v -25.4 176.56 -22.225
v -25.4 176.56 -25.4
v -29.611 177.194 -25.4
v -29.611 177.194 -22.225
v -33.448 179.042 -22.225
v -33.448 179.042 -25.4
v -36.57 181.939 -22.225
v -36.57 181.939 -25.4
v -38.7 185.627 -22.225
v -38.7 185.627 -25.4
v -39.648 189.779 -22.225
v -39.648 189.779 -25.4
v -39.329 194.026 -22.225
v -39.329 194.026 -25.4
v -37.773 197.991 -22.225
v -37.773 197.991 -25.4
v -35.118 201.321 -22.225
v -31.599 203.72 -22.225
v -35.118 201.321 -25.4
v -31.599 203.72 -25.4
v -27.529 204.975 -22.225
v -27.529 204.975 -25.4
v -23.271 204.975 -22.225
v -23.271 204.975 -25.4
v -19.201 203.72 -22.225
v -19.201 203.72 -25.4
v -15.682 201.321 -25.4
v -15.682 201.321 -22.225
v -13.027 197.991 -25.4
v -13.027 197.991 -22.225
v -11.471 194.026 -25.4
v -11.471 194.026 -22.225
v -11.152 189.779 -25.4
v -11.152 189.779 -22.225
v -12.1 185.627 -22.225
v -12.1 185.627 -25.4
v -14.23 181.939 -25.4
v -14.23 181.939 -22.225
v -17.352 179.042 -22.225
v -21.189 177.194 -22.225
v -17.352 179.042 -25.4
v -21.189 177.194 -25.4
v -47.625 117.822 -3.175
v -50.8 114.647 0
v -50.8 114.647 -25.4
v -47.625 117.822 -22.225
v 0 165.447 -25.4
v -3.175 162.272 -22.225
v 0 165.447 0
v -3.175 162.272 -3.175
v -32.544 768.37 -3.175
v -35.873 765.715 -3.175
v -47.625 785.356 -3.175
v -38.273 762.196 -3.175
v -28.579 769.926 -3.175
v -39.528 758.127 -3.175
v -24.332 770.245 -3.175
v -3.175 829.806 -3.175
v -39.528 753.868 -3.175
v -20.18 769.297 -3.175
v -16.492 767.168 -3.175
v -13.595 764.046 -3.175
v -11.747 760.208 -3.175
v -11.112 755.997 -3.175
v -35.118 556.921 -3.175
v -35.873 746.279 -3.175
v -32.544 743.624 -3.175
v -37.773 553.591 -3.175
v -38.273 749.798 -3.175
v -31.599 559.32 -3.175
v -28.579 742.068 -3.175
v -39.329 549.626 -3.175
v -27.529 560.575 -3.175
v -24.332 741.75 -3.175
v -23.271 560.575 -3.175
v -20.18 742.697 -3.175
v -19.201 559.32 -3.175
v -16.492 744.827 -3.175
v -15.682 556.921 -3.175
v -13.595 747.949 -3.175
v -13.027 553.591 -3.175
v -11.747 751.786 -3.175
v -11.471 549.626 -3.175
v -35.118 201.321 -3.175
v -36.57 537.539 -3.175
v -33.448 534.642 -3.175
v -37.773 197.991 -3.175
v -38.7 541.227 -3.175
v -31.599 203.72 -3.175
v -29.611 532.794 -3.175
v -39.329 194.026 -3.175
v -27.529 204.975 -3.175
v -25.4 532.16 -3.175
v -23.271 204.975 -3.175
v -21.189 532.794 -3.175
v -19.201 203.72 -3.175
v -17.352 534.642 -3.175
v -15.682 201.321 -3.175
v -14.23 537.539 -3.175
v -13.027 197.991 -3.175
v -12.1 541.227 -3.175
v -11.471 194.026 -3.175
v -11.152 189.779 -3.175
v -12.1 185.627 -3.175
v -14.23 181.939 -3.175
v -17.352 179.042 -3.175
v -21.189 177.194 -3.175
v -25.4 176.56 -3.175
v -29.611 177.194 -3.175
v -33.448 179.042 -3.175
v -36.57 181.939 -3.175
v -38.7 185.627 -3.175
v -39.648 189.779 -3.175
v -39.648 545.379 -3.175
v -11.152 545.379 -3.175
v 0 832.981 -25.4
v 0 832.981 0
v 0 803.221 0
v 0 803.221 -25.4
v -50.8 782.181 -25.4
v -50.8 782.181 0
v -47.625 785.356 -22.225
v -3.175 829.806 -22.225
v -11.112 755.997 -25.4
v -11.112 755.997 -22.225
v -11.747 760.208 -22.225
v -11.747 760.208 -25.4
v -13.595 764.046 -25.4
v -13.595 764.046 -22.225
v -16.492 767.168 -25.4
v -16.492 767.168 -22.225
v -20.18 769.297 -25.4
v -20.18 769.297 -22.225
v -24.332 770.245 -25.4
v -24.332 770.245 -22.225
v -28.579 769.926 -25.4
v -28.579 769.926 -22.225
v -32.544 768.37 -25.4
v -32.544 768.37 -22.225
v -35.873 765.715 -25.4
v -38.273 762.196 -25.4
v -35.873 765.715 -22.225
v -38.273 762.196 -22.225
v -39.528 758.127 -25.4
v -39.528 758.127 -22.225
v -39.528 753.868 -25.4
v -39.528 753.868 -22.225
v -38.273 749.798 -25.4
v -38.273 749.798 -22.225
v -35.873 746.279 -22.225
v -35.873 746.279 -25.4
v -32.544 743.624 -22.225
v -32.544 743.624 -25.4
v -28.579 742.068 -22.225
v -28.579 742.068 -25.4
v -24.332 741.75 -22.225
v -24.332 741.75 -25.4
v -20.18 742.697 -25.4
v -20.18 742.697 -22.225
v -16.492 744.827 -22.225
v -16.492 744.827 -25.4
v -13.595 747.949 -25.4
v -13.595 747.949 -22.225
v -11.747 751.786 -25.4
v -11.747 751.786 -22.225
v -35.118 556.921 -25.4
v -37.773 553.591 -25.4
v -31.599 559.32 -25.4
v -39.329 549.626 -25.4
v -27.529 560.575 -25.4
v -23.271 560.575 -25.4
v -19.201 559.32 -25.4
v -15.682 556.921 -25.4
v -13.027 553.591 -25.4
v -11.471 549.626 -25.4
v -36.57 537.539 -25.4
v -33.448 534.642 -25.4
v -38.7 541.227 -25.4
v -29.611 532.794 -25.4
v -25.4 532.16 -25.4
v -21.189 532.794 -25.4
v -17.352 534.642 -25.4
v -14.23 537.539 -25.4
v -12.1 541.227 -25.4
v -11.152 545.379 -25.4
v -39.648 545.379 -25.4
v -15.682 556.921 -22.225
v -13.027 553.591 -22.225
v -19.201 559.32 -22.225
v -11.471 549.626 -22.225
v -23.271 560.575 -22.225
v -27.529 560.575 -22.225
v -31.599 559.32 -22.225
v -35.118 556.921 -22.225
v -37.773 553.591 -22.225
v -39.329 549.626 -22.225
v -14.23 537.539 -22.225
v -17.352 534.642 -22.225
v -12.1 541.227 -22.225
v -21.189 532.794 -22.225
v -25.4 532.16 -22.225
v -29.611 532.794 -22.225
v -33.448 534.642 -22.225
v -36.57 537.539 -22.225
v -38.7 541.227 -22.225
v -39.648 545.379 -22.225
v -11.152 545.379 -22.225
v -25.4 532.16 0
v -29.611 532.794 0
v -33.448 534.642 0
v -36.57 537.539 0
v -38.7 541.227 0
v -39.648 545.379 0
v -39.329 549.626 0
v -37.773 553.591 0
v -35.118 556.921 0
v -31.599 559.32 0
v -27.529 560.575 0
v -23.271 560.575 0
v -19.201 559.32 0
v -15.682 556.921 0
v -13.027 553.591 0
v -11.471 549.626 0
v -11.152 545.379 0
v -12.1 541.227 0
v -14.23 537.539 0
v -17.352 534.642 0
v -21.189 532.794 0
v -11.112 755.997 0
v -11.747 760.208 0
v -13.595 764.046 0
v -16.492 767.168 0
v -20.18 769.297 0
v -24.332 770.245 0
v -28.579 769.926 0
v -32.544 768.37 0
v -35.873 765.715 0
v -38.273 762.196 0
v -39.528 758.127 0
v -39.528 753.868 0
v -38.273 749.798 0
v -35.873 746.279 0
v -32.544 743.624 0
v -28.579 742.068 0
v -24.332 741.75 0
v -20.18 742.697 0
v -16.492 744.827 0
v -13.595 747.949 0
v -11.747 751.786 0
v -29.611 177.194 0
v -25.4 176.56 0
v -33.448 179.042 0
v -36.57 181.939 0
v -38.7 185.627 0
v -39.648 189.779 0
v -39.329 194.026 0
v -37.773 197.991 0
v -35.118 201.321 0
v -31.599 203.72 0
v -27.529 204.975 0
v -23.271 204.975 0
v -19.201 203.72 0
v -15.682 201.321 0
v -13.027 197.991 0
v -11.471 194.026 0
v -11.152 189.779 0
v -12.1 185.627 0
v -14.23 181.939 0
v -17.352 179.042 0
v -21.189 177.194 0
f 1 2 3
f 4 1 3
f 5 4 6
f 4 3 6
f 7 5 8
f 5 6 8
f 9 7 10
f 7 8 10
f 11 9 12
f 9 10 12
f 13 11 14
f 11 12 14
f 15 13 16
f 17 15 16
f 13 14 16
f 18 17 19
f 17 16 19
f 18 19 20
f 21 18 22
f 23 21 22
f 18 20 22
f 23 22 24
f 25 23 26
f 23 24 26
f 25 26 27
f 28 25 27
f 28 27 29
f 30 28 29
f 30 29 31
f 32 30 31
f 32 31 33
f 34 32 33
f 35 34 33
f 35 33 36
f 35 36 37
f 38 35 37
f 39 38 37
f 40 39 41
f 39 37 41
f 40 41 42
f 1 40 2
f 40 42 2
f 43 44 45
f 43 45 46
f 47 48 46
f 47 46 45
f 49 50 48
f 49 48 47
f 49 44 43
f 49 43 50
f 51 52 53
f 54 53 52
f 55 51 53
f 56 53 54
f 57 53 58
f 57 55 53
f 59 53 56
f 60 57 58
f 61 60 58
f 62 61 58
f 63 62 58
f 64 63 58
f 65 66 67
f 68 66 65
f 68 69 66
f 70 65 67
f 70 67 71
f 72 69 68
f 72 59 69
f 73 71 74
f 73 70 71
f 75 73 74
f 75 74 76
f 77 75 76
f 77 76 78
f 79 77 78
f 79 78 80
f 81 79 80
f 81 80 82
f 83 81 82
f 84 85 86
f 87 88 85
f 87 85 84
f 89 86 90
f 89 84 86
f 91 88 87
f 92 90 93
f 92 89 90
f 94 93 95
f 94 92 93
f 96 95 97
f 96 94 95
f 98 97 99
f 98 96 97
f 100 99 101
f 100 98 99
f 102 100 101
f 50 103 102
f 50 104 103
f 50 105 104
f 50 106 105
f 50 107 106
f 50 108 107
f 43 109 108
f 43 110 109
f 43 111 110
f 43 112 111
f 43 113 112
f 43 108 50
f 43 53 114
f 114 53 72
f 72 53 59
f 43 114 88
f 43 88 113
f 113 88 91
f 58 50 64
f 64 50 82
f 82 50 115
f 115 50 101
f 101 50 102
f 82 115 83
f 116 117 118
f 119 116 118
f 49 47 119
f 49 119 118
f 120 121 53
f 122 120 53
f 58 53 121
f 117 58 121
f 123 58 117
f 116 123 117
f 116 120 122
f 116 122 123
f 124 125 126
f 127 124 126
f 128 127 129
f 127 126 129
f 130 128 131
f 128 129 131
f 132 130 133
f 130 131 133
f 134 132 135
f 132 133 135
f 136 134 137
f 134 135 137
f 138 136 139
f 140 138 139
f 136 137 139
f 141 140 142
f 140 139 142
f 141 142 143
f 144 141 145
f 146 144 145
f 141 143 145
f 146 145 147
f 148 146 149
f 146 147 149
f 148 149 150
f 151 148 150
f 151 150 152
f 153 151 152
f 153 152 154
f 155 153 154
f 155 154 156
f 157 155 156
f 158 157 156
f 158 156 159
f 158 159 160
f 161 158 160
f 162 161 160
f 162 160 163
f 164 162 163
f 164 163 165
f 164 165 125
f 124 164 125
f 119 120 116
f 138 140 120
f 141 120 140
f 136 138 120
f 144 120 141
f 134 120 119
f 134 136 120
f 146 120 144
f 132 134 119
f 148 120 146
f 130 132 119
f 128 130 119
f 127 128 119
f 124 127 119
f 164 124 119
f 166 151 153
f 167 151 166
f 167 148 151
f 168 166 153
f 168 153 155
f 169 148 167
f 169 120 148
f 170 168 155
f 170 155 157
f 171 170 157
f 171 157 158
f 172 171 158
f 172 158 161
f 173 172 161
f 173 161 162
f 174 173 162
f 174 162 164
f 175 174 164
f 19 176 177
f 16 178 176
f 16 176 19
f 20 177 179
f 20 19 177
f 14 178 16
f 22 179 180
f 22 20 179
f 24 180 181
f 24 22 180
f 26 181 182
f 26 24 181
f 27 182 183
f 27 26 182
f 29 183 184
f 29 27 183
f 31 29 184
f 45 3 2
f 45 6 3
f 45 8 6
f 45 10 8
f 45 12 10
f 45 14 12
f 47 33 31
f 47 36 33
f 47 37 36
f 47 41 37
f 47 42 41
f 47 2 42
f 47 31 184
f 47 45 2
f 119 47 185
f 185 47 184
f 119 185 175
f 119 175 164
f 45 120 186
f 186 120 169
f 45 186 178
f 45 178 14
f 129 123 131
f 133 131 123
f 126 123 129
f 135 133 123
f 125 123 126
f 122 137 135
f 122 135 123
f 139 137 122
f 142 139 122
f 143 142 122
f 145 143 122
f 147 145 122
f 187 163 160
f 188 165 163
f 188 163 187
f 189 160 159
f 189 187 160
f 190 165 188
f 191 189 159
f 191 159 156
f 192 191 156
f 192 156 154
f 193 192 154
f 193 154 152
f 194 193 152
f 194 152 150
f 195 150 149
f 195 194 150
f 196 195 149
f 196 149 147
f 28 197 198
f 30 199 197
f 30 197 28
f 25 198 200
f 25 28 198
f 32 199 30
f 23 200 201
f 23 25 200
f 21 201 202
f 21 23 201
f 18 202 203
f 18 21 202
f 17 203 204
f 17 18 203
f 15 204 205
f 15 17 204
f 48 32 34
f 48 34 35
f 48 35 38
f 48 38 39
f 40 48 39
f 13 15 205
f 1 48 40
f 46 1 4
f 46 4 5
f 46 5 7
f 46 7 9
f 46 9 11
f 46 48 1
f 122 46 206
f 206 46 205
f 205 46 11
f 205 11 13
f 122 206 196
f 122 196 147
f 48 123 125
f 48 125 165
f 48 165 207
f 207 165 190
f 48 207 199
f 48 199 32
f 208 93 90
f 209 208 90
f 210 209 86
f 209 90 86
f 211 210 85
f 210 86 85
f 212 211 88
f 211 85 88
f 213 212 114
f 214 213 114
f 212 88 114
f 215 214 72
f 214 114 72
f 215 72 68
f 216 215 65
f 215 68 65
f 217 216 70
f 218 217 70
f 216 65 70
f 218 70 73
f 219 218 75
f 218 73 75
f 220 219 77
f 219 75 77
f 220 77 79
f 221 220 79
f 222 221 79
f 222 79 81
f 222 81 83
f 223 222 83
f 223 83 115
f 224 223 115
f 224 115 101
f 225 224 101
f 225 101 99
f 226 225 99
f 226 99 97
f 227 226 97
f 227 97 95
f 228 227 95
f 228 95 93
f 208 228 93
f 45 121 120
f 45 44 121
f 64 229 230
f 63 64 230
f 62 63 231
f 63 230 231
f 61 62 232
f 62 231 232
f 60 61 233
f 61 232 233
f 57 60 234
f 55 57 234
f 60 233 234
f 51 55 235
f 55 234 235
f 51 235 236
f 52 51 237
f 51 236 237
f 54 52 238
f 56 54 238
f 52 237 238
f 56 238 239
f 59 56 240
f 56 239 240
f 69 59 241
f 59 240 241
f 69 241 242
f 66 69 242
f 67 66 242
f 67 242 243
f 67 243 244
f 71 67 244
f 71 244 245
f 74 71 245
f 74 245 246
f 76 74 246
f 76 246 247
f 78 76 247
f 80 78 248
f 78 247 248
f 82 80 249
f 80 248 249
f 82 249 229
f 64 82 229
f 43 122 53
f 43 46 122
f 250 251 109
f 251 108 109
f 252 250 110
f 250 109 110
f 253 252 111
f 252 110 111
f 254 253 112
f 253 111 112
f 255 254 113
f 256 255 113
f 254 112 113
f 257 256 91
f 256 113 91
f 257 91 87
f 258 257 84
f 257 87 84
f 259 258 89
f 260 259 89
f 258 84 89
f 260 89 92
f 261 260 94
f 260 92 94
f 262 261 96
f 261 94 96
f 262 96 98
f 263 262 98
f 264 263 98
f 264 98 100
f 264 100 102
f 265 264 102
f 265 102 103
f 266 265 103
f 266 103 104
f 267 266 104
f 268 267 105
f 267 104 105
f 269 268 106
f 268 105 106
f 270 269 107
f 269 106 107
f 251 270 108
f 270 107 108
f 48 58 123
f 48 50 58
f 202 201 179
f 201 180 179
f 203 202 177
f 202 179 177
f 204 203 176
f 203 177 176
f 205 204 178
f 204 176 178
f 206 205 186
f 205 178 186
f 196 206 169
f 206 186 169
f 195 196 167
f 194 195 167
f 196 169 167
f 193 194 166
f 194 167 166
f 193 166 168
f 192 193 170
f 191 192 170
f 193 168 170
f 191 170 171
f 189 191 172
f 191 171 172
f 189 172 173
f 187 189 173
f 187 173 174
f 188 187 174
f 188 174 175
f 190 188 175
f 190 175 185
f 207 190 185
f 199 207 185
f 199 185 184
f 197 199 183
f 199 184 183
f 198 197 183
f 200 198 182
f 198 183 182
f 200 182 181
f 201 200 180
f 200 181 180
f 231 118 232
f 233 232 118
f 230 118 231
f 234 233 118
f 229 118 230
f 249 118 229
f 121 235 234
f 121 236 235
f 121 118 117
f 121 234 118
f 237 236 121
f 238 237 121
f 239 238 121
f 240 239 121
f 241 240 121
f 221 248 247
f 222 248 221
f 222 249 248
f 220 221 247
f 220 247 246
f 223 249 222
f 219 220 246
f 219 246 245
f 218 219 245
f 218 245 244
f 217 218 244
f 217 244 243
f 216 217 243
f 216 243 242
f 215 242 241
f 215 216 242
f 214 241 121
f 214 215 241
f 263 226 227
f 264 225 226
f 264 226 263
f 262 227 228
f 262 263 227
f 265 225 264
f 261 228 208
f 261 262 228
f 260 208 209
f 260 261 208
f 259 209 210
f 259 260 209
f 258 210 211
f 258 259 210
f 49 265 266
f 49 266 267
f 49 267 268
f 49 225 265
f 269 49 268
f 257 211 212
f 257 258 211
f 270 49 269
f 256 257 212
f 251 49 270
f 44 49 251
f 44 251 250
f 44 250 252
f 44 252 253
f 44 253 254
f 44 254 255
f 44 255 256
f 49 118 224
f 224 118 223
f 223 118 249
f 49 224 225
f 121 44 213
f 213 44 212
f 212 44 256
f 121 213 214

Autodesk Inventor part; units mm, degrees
ref_plane "YZ Plane" through (0, 0, 0) normal (1, 0, 0) x (0, 1, 0)
ref_plane "XZ Plane" through (0, 0, 0) normal (0, 1, 0) x (-1, 0, 0)
ref_plane "XY Plane" through (0, 0, 0) normal (0, 0, 1) x (1, 0, 0)
sketch "Sketch1" plane through (0, 0, 0) normal (0, 1, 0) x (-1, 0, 0)
  line L0 (0, 0) -> (50.8, 0)
  line L1 (50.8, 0) -> (50.8, -25.4)
  line L2 (50.8, -25.4) -> (0, -25.4)
  line L3 (0, -25.4) -> (0, 0)
  line L4 (47.625, -22.225) -> (47.625, -3.175)
  line L5 (47.625, -3.175) -> (3.175, -3.175)
  line L6 (3.175, -3.175) -> (3.175, -22.225)
  line L7 (3.175, -22.225) -> (47.625, -22.225)
  dimension "d0" = 50.8
  dimension "d1" = 25.4
  dimension "d2" = 3.175
extrude "Extrusion1" add sketch "Sketch1" along normal blind 886.206
sketch "Sketch2" plane through (-50.8, 0, 0) normal (0, 0, 1) x (1, 0, 0)
  line L0 (50.8, 0) -> (0, 0) projected
  line L1 (50.8, 0) -> (50.8, 886.206) projected
  line L2 (0, 886.206) -> (50.8, 886.206) projected
  line L3 (0, 0) -> (0, 886.206) projected
  line L4 (0, 0) -> (50.8, 0) projected
  line L5 (50.8, 0) -> (0, 56.4191)
  line L6 (0, 56.4191) -> (50.8, 56.4191)
  line L7 (50.8, 56.4191) -> (50.8, 0)
  line L8 (50.8, 0) -> (0, 0)
  line L9 (0, 0) -> (0, 56.4191)
  line L10 (0, 56.4191) -> (50.8, 0)
  line L11 (0, 56.4191) -> (21.859, 0)
  line L12 (47.625, 0) -> (3.175, 0) projected
  dimension "d5" = 48
extrude "Extrusion2" cut sketch "Sketch2" against normal blind 914.4 contours L0 L11 L5 | L11 L0 L3
sketch "Sketch3" plane through (-50.8, 886.206, 0) normal (0, 0, 1) x (1, 0, 0)
  line L0 (0, -829.7869) -> (50.8, -886.206) projected
  line L1 (50.8, -886.206) -> (50.8, 0) projected
  line L2 (0, 0) -> (50.8, 0) projected
  line L3 (0, -829.7869) -> (0, 0) projected
  line L4 (0, -829.7869) -> (50.8, -886.206) projected
  line L5 (0, -829.7869) -> (50.8, -778.9869)
  line L6 (50.8, -886.206) -> (50.8, 0) projected
  line L7 (0, -829.7869) -> (0, 0) projected
  line L8 (50.8, -886.206) -> (0, -886.206)
  line L9 (0, -886.206) -> (0, -923.3654)
  line L10 (0, -923.3654) -> (50.8, -923.3654)
  line L11 (50.8, -923.3654) -> (50.8, -886.206)
  dimension "d8" = 93
extrude "Extrusion3" cut sketch "Sketch3" against normal blind 25.4 contours L5 L1 L0
sketch "Sketch4" plane through (-50.8, 886.206, 0) normal (0, 0, 1) x (1, 0, 0)
  line L0 (0, -829.7869) -> (50.8, -778.9869) projected
  line L1 (50.8, -778.9869) -> (50.8, 0) projected
  line L2 (0, 0) -> (50.8, 0) projected
  line L3 (0, -829.7869) -> (0, 0) projected
  line L4 (0, 0) -> (50.8, 0) projected
  line L5 (0, 0) -> (50.8, 0)
  line L6 (50.8, 0) -> (50.8, -221.7928)
  line L7 (50.8, -221.7928) -> (0, -221.7928)
  line L8 (0, -221.7928) -> (0, 0)
  line L9 (0, -829.7869) -> (0, 0) projected
  line L10 (0, 0) -> (50.8, -50.8)
  line L11 (50.8, 0) -> (0, 0)
  line L12 (0, 0) -> (0, -56.4191)
  line L13 (0, -56.4191) -> (50.8, -56.4191)
  line L14 (50.8, -56.4191) -> (50.8, 0)
  point P0 (50.8, -886.206)
  dimension "d11" = 221.7928
  dimension "d12" = 45
  dimension "d13" = 56.4191
extrude "Extrusion4" cut sketch "Sketch4" against normal blind 25.4 contours L2 L1 L10
sketch "Sketch8" plane through (-50.8, 56.4191, 0) normal (0, 0, 1) x (1, 0, 0)
  line L0 (50.8, 778.9869) -> (0, 829.7869) projected
  line L1 (0, 0) -> (0, 829.7869) projected
  line L2 (0, 0) -> (50.8, 50.8) projected
  line L3 (50.8, 50.8) -> (50.8, 778.9869) projected
  line L4 (0, 797.6016) -> (50.8, 746.8016)
  point P0 (50.8, -56.4191)
  dimension "d24" = 22.7584
extrude "Extrusion8" cut sketch "Sketch8" against normal blind 25.4 contours L3 L4 L1 L0
sketch "Sketch9" plane through (-50.8, 56.4191, 0) normal (0, 0, 1) x (1, 0, 0)
  line L0 (50.8, 746.8016) -> (0, 797.6016) projected
  line L1 (0, 0) -> (0, 797.6016) projected
  line L2 (0, 0) -> (50.8, 50.8) projected
  line L3 (50.8, 50.8) -> (50.8, 746.8016) projected
  line L4 (0, 0) -> (0, 797.6016) projected
  line L5 (0, 58.228) -> (50.8, 109.028)
  line L6 (50.8, 50.8) -> (50.8, 746.8016) projected
  line L7 (0, 0) -> (50.8, 50.8) projected
  point P0 (50.8, -56.4191)
  dimension "d27" = 41.1734
extrude "Extrusion9" cut sketch "Sketch9" against normal blind 25.4 contours L3 L2 L1 L5
sketch "Sketch10" plane through (-50.8, 114.6471, 0) normal (0, 0, 1) x (1, 0, 0)
  line L0 (0, 0) -> (50.8, 50.8) projected
  line L1 (50.8, 50.8) -> (50.8, 688.5737) projected
  line L2 (50.8, 688.5737) -> (0, 739.3737) projected
  line L3 (0, 0) -> (0, 739.3737) projected
  point P0 (50.8, -114.6471)
  point P1 (25.4, 76.2)
hole "Hole1" at (-25.4, 190.8471, 0) direction (0, 0, -1) diameter 28.575 end through all
sketch "Sketch11" plane through (-50.8, 114.6471, 0) normal (0, 0, 1) x (1, 0, 0)
  circle A0 centre (25.4, 76.2) radius 14.2875 projected
  line L0 (0, 0) -> (50.8, 50.8) projected
  line L1 (50.8, 50.8) -> (50.8, 688.5737) projected
  line L2 (50.8, 688.5737) -> (0, 739.3737) projected
  line L3 (0, 0) -> (0, 739.3737) projected
  point P0 (50.8, -114.6471)
  point P1 (25.4, 431.8)
  dimension "d37" = 355.6
hole "Hole2" at (-25.4, 546.4471, 0) direction (0, 0, -1) diameter 28.575 end through all
sketch "Sketch12" plane through (-50.8, 114.6471, 0) normal (0, 0, 1) x (1, 0, 0)
  circle A0 centre (25.4, 431.8) radius 14.2875 projected
  circle A1 centre (25.4, 76.2) radius 14.2875 projected
  line L0 (50.8, 50.8) -> (0, 0) projected
  line L1 (0, 0) -> (0, 739.3737) projected
  line L2 (0, 739.3737) -> (50.8, 688.5737) projected
  line L3 (50.8, 50.8) -> (50.8, 688.5737) projected
  line L4 (50.8, 50.8) -> (50.8, 688.5737) projected
  line L5 (50.8, 688.5737) -> (29.7688, 688.5737)
  line L6 (29.7688, 688.5737) -> (29.7688, 709.6049)
  line L7 (29.7688, 709.6049) -> (50.8, 709.6049)
  line L8 (50.8, 709.6049) -> (50.8, 688.5737)
  line L9 (50.8, 709.6049) -> (0, 658.8049)
  line L10 (0, 0) -> (0, 739.3737) projected
  line L11 (0, 658.8049) -> (50.8, 658.8049)
  line L12 (50.8, 658.8049) -> (50.8, 739.3737)
  line L13 (50.8, 739.3737) -> (0, 739.3737)
  line L14 (0, 739.3737) -> (0, 658.8049)
  line L15 (0, 739.3737) -> (50.8, 688.5737)
  line L16 (50.8, 709.6049) -> (29.7688, 688.5737)
  line L17 (50.8, 688.5737) -> (50.8, 709.6049)
  line L18 (29.7688, 688.5737) -> (50.8, 688.5737)
  point P0 (50.8, -114.6471)
  dimension "d45" = 21.0312
  dimension "d46" = 21.0312
  dimension "d47" = 50.8
  dimension "d48" = 80.5688
  dimension "d49" = 50.8
extrude "Extrusion10" add sketch "Sketch12" against normal blind 25.4 contours L5 L9 L2 | L2 L9 L8
extrude "Extrusion11" cut sketch "Sketch12" against normal blind 25.4 contours L1 L2 L6 L9 | L13 L12 L7 L2
sketch "Sketch14" plane through (0, 165.4471, -25.4) normal (0, 0, -1) x (-1, 0, 0)
  circle A0 centre (25.4, 381) radius 14.2875 projected
  circle A1 centre (25.4, 25.4) radius 14.2875 projected
  line L0 (50.8, 608.0049) -> (21.0312, 637.7737) projected
  line L1 (21.0312, 637.7737) -> (21.0312, 658.8049) projected
  line L2 (21.0312, 658.8049) -> (10.5156, 648.2893) projected
  line L3 (10.5156, 648.2893) -> (0, 658.8049) projected
  line L4 (0, 0) -> (0, 658.8049) projected
  line L5 (0, 0) -> (50.8, -50.8) projected
  line L6 (50.8, -50.8) -> (50.8, 608.0049) projected
  line L7 (10.5156, 648.2893) -> (21.0312, 637.7737)
  line L8 (21.0312, 637.7737) -> (47.625, 611.1799) projected
  line L9 (21.0312, 637.7737) -> (21.0312, 658.8049) projected
  line L10 (21.0312, 658.8049) -> (21.0312, 637.7737)
  line L11 (10.5156, 648.2893) -> (21.0312, 658.8049)
  point P0 (0, -165.4471)
extrude "Extrusion12" cut sketch "Sketch14" against normal through all contours L7 L2 L1
sketch "Sketch15" plane through (0, 0, 0) normal (0, 1, 0) x (-1, 0, 0)
  line L0 (47.625, -22.225) -> (3.175, -22.225) projected
  line L1 (3.175, -3.175) -> (47.625, -3.175) projected
  line L2 (47.625, -3.175) -> (47.625, -22.225) projected
  line L3 (3.175, -22.225) -> (3.175, -3.175) projected
  point P0 (0, 0)
extrude "Extrusion13" cut sketch "Sketch15" along normal blind 2540
sketch "Sketch16" plane through (0, 165.4471, -25.4) normal (0, 0, -1) x (-1, 0, 0)
  line L0 (50.8, 608.0049) -> (0, 658.8049) projected
  line L1 (0, 0) -> (0, 658.8049) projected
  line L2 (0, 0) -> (50.8, -50.8) projected
  line L3 (50.8, -50.8) -> (50.8, 608.0049) projected
  circle A0 centre (25.4, 25.4) radius 14.2875 projected
  circle A1 centre (25.4, 381) radius 14.2875 projected
  line L4 (50.8, 608.0049) -> (-0.2406, 608.0049)
  line L5 (11.1125, 647.6924) -> (15.4769, 652.0568)
  line L6 (50.8, 616.7337) -> (-0.2406, 667.7743)
  line L7 (47.625, 611.1799) -> (3.175, 655.6299) projected
  line L8 (0, 658.8049) -> (0, 667.5337)
  line L9 (0, 658.8049) -> (50.8, 608.0049) projected
  line L10 (50.8, 608.0049) -> (50.8, 616.7337)
  line L11 (0, 658.8049) -> (50.8, 608.0049)
  point P0 (0, -165.4471)
  dimension "d58" = 6.1722
  dimension "d59" = 90
  dimension "d60" = 8.7288
extrude "Extrusion14" add sketch "Sketch16" against normal blind 25.4 contours L0 L5 L6 L10 | L0 L8 L6 L5
sketch "Sketch17" plane through (0, 0, 0) normal (0, 1, 0) x (-1, 0, 0)
  line L0 (47.625, -3.175) -> (3.175, -3.175) projected
  line L1 (47.625, -22.225) -> (47.625, -3.175) projected
  line L2 (47.625, -22.225) -> (3.175, -22.225) projected
  line L3 (3.175, -22.225) -> (3.175, -3.175) projected
  point P0 (0, 0)
extrude "Extrusion15" cut sketch "Sketch17" along normal blind 2540
sketch "Sketch18" plane through (-50.8, 114.6471, 0) normal (0, 0, 1) x (1, 0, 0)
  circle A0 centre (25.4, 431.8) radius 14.2875 projected
  circle A1 centre (25.4, 431.8) radius 14.2875
  circle A2 centre (25.4, 641.35) radius 14.2875
  point P0 (50.8, -114.6471)
  dimension "d65" = 28.575
  dimension "d66" = 209.55
extrude "Extrusion16" cut sketch "Sketch18" against normal blind 25.4 contours A2
properties part number "AngleBrace.ver2-1111-2020" material "Aluminum 6061"
